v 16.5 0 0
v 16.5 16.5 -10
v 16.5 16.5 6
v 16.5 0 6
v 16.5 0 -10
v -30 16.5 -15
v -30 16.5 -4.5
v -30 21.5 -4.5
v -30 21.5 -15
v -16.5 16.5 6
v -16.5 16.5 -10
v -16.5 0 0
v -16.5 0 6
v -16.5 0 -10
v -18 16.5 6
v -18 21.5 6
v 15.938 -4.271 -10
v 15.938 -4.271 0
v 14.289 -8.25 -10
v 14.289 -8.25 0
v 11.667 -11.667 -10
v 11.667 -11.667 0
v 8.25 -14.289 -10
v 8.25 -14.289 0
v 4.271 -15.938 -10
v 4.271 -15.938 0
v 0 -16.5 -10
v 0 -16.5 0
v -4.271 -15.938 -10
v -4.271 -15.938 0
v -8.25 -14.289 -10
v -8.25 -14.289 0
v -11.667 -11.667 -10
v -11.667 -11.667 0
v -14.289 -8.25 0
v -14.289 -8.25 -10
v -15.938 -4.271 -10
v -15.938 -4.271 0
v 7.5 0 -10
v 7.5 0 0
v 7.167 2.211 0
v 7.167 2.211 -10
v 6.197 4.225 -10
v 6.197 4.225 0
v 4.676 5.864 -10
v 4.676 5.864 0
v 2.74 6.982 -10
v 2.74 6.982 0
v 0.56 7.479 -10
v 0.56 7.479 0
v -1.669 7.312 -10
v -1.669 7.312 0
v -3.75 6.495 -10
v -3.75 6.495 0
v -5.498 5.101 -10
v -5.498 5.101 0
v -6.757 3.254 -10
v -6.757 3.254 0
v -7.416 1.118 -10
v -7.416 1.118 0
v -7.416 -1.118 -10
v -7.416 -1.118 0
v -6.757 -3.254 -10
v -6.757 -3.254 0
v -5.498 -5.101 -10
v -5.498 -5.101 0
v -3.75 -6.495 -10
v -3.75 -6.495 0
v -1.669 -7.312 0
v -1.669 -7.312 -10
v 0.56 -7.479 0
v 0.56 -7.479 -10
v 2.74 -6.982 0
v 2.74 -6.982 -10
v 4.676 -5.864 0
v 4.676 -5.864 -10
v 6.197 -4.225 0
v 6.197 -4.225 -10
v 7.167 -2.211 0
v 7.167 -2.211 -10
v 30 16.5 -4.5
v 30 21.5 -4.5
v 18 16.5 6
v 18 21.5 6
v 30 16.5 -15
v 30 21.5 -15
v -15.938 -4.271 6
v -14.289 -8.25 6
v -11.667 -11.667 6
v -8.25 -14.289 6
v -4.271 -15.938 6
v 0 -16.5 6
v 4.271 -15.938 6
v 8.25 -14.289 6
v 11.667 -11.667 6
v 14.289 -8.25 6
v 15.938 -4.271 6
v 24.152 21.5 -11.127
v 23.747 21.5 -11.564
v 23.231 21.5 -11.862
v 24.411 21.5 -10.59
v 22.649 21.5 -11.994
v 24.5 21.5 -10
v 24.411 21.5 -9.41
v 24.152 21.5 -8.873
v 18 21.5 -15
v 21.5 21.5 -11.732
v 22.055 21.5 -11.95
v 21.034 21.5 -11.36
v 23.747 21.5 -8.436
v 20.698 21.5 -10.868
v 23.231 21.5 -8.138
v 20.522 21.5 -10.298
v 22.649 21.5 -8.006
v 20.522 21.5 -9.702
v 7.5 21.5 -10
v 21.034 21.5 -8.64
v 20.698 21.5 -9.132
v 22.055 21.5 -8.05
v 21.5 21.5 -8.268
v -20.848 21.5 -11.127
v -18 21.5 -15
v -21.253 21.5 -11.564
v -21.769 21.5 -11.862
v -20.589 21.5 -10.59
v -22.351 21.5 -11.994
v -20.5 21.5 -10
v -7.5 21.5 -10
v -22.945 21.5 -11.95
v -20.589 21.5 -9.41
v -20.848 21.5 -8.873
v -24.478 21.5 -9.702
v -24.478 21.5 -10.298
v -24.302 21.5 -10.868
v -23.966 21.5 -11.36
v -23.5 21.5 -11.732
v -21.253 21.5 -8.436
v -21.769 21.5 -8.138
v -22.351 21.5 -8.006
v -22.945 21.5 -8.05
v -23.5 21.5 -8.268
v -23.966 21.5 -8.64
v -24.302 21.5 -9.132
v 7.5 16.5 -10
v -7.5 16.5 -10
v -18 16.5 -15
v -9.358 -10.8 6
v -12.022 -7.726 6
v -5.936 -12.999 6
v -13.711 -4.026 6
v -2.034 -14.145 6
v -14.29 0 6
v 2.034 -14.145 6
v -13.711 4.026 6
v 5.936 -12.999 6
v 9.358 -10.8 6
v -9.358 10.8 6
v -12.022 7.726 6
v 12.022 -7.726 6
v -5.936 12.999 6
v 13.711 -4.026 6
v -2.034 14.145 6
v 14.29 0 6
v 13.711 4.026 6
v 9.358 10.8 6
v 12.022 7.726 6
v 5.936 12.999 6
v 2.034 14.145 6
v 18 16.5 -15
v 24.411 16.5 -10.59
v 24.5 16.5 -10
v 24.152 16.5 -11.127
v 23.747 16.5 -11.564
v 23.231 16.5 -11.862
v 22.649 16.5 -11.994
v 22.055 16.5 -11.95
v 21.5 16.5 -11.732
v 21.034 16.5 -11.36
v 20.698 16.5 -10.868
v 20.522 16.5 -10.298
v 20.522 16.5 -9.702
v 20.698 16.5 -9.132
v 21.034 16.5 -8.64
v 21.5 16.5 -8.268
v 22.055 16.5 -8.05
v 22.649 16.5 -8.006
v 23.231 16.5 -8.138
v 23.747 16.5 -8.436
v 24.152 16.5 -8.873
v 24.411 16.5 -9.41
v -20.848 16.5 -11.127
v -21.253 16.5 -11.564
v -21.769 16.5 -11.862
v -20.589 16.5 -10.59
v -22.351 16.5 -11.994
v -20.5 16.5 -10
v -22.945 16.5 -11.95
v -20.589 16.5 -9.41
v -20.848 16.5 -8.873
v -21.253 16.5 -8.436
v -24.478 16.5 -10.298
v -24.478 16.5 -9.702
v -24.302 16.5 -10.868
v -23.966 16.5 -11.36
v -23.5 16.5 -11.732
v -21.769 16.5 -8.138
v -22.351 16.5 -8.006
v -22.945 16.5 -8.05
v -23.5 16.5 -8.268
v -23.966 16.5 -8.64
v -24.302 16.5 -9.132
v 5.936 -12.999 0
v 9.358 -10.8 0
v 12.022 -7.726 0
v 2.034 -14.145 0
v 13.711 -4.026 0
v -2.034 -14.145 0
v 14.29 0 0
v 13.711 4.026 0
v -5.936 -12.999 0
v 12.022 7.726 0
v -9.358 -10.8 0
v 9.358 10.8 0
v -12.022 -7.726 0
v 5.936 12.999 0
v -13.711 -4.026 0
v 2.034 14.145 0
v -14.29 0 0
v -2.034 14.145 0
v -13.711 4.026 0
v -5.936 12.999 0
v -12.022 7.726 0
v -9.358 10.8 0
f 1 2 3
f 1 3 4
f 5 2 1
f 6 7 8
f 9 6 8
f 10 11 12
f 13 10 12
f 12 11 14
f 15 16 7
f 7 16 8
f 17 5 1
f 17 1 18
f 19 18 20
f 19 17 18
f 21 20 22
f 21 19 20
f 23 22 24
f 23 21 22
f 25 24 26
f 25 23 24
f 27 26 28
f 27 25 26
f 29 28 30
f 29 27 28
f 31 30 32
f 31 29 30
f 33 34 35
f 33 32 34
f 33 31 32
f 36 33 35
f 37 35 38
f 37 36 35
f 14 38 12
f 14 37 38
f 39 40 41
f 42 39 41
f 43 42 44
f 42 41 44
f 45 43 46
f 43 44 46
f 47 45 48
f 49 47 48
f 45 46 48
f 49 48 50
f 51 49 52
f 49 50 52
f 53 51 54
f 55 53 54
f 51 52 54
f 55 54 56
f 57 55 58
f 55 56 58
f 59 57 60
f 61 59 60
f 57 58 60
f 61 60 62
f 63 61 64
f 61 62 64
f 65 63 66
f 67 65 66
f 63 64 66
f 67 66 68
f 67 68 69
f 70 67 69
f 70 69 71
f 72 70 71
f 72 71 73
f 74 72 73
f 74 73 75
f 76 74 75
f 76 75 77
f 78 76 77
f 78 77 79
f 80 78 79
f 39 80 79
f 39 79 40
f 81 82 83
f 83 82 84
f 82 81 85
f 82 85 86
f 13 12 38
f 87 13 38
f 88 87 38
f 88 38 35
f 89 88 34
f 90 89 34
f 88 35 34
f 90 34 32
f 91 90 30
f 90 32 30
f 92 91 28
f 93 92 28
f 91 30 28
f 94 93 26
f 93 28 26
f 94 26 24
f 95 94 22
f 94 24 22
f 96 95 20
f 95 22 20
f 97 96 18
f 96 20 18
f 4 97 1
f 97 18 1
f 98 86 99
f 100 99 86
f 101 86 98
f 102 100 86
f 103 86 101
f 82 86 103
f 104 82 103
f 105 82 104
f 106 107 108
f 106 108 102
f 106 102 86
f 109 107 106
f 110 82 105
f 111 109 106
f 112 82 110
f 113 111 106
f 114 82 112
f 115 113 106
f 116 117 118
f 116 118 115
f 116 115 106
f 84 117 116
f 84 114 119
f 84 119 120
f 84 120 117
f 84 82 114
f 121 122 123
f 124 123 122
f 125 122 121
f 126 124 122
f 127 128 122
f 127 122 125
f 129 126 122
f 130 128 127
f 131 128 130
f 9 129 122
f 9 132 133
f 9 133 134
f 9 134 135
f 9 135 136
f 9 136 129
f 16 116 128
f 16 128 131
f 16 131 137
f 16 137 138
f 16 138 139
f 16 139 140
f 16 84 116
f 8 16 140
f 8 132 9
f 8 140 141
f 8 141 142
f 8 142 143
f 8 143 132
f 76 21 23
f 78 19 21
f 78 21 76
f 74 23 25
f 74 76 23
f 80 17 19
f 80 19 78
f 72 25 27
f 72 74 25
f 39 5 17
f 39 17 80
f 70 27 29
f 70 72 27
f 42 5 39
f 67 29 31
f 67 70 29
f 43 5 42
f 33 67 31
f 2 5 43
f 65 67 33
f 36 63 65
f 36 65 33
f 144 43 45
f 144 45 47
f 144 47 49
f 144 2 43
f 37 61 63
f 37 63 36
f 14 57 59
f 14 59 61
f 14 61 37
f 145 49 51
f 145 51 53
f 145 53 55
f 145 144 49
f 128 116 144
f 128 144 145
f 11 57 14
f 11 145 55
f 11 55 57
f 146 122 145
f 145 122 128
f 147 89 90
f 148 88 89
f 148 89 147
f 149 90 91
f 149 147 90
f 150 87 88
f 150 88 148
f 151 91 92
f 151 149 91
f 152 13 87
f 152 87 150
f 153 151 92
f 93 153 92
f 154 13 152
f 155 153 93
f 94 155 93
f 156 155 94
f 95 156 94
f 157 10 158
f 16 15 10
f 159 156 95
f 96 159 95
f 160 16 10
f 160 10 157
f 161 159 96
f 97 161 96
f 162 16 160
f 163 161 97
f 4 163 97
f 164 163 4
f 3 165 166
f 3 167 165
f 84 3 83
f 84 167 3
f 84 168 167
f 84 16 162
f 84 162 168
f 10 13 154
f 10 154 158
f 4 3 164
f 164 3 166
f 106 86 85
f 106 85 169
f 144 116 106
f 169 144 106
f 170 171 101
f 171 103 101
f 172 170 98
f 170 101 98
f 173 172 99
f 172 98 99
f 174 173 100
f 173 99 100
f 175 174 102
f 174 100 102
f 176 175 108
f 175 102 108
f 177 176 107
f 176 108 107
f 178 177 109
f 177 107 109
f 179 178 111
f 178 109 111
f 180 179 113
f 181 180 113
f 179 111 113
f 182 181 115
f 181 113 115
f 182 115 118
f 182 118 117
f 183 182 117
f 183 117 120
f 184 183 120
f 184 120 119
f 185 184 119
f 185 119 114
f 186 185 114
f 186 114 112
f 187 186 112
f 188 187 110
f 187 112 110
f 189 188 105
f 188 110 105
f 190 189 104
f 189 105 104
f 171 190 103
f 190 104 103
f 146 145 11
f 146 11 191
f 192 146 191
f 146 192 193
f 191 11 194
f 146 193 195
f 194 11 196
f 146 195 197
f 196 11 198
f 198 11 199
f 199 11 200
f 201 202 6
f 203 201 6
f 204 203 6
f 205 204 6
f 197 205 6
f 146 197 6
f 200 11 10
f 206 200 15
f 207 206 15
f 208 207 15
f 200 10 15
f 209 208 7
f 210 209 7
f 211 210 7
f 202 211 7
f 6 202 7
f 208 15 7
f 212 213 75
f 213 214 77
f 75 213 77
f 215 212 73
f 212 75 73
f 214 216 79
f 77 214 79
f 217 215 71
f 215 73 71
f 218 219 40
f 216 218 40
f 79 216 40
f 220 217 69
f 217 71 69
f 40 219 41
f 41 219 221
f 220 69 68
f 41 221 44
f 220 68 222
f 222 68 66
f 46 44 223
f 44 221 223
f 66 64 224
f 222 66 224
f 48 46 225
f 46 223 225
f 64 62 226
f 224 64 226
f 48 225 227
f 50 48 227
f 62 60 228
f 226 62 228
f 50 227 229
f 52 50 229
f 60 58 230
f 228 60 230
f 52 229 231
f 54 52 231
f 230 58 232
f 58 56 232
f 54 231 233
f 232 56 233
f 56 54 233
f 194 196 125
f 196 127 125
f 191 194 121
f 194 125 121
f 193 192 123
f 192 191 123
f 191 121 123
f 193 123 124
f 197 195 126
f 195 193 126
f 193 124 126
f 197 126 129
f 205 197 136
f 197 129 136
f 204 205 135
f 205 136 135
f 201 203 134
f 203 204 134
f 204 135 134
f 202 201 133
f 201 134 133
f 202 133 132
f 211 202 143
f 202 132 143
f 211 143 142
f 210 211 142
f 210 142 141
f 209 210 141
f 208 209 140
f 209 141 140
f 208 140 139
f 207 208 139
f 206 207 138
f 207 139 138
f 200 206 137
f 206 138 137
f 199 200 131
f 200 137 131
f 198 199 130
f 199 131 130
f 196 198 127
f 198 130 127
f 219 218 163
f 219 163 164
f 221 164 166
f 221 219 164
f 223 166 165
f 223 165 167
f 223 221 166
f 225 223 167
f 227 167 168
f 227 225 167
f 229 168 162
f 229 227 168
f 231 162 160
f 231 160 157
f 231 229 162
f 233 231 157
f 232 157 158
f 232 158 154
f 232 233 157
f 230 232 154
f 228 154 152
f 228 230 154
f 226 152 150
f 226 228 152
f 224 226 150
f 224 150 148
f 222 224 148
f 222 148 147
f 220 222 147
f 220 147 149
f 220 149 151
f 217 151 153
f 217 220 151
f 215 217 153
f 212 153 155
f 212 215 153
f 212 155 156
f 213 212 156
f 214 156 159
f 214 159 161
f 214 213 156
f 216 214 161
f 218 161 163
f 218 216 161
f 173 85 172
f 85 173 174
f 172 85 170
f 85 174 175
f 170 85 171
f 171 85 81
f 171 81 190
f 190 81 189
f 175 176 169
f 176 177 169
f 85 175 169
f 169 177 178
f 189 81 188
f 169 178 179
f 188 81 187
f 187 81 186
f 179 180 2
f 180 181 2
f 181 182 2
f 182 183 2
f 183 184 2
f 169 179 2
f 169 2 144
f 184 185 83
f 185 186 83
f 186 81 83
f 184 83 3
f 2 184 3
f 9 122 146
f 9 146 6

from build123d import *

# Parameters (mm, degrees)
ESQUISSE1_R             = 16.5
ESQUISSE1_R_2           = 14.29
BOSS_EXTRU_1_DEPTH      = 6
BOSS_EXTRU_2_START      = 10
ESQUISSE2_R             = 16.5
BOSS_EXTRU_2_DEPTH      = 10
BOSS_EXTRU_3_DEPTH      = 5
BOSS_EXTRU_4_DEPTH      = 16
ESQUISSE7_R             = 2
ESQUISSE7_W             = 60
ESQUISSE7_H             = 4
ENL_V_MAT_EXTRU_1_DEPTH = 57.071383076
ESQUISSE8_R             = 7.5
ENL_V_MAT_EXTRU_2_DEPTH = 39.23937761
ESQUISSE10_W            = 60
ESQUISSE10_H            = 5
BOSS_EXTRU_5_DEPTH      = 5
ESQUISSE11_W            = 15
ESQUISSE11_H            = 5
ENL_V_MAT_EXTRU_4_DEPTH = 5


with BuildPart() as part:
    # Esquisse1 → Boss.-Extru.1 (new body)
    with BuildSketch(Plane.XY):
        Circle(ESQUISSE1_R)
        Circle(ESQUISSE1_R_2, mode=Mode.SUBTRACT)
    extrude(amount=BOSS_EXTRU_1_DEPTH)

    # Esquisse2 → Boss.-Extru.2 (add)
    with BuildSketch(Plane(origin=(0, 0, 0), x_dir=(-1, 0, 0), z_dir=(0, 0, -1)).offset(BOSS_EXTRU_2_START)):
        Circle(ESQUISSE2_R)
    extrude(amount=-BOSS_EXTRU_2_DEPTH)



with BuildPart() as body_2:
    # Esquisse3 → Boss.-Extru.3 (new body)
    with BuildSketch(Plane(origin=(0, 16.5, 0), x_dir=(1, 0, 0), z_dir=(0, 1, 0))):
        Polygon((0, 10), (40, 10), (40, -10), (0, -10), (-40, -10), (-40, 10), align=None)
    extrude(amount=BOSS_EXTRU_3_DEPTH)


with BuildPart() as part_1:
    add(part.part)

    add(body_2.part)  # Boss.-Extru.4 merges body 2
    # Esquisse4 → Boss.-Extru.4 (add)
    with BuildSketch(Plane.XY.offset(-10)):
        with BuildLine():
            ThreePointArc((-16.5, 0), (-11.66726189, 11.66726189), (0, 16.5))
            Line((0, 16.5), (-16.5, 16.5))
            Line((-16.5, 16.5), (-16.5, 0))
        make_face()
        with BuildLine():
            ThreePointArc((16.5, 0), (11.66726189, 11.66726189), (0, 16.5))
            Line((0, 16.5), (16.5, 16.5))
            Line((16.5, 16.5), (16.5, 0))
        make_face()
    extrude(amount=BOSS_EXTRU_4_DEPTH)

    # Esquisse7 → Enlèv. mat.-Extru.1 (cut, through all)
    with BuildSketch(Plane(origin=(0, 21.5, 0), x_dir=(1, 0, 0), z_dir=(0, 1, 0))):
        Polygon((-40, -10), (-30, -10), (-30, -6), (-30, 10), (-40, 10), align=None)
        Polygon((30, -6), (30, -10), (40, -10), (40, 10), (30, 10), align=None)
        with Locations((22.5, 10)):
            Circle(ESQUISSE7_R)
        with Locations((-22.5, 10)):
            Circle(ESQUISSE7_R)
        with Locations((0, -8)):
            Rectangle(ESQUISSE7_W, ESQUISSE7_H)
    extrude(amount=-ENL_V_MAT_EXTRU_1_DEPTH, mode=Mode.SUBTRACT)

    # Esquisse8 → Enlèv. mat.-Extru.2 (cut, through all)
    with BuildSketch(Plane.XY):
        Circle(ESQUISSE8_R)
    extrude(amount=-ENL_V_MAT_EXTRU_2_DEPTH, mode=Mode.SUBTRACT)

    # Esquisse10 → Boss.-Extru.5 (add)
    with BuildSketch(Plane(origin=(0, 0, -10), x_dir=(-1, 0, 0), z_dir=(0, 0, -1))):
        with Locations((0, 19)):
            Rectangle(ESQUISSE10_W, ESQUISSE10_H)
    extrude(amount=BOSS_EXTRU_5_DEPTH)

    # Esquisse11 → Enlèv. mat.-Extru.4 (cut)
    with BuildSketch(Plane(origin=(0, 21.5, 0), x_dir=(1, 0, 0), z_dir=(0, 1, 0))):
        Polygon((-18, -6), (-30, 4.5), (-30, -6), align=None)
        Polygon((30, 4.5), (18, -6), (30, -6), align=None)
        with BuildLine():
            Line((20.5, 10), (24.5, 10))
            ThreePointArc((24.5, 10), (22.5, 12), (20.5, 10))
        make_face()
        with BuildLine():
            ThreePointArc((20.5, 10), (22.5, 8), (24.5, 10))
            Line((24.5, 10), (20.5, 10))
        make_face()
        with BuildLine():
            Line((-24.5, 10), (-20.5, 10))
            ThreePointArc((-20.5, 10), (-22.5, 12), (-24.5, 10))
        make_face()
        with BuildLine():
            ThreePointArc((-24.5, 10), (-22.5, 8), (-20.5, 10))
            Line((-20.5, 10), (-24.5, 10))
        make_face()
        Polygon((-7.5, 15), (-18, 15), (-7.5, 10), align=None)
        with Locations((0, 12.5)):
            Rectangle(ESQUISSE11_W, ESQUISSE11_H)
        Polygon((7.5, 10), (18, 15), (7.5, 15), align=None)
    extrude(amount=-ENL_V_MAT_EXTRU_4_DEPTH, mode=Mode.SUBTRACT)


solid = part_1.part
